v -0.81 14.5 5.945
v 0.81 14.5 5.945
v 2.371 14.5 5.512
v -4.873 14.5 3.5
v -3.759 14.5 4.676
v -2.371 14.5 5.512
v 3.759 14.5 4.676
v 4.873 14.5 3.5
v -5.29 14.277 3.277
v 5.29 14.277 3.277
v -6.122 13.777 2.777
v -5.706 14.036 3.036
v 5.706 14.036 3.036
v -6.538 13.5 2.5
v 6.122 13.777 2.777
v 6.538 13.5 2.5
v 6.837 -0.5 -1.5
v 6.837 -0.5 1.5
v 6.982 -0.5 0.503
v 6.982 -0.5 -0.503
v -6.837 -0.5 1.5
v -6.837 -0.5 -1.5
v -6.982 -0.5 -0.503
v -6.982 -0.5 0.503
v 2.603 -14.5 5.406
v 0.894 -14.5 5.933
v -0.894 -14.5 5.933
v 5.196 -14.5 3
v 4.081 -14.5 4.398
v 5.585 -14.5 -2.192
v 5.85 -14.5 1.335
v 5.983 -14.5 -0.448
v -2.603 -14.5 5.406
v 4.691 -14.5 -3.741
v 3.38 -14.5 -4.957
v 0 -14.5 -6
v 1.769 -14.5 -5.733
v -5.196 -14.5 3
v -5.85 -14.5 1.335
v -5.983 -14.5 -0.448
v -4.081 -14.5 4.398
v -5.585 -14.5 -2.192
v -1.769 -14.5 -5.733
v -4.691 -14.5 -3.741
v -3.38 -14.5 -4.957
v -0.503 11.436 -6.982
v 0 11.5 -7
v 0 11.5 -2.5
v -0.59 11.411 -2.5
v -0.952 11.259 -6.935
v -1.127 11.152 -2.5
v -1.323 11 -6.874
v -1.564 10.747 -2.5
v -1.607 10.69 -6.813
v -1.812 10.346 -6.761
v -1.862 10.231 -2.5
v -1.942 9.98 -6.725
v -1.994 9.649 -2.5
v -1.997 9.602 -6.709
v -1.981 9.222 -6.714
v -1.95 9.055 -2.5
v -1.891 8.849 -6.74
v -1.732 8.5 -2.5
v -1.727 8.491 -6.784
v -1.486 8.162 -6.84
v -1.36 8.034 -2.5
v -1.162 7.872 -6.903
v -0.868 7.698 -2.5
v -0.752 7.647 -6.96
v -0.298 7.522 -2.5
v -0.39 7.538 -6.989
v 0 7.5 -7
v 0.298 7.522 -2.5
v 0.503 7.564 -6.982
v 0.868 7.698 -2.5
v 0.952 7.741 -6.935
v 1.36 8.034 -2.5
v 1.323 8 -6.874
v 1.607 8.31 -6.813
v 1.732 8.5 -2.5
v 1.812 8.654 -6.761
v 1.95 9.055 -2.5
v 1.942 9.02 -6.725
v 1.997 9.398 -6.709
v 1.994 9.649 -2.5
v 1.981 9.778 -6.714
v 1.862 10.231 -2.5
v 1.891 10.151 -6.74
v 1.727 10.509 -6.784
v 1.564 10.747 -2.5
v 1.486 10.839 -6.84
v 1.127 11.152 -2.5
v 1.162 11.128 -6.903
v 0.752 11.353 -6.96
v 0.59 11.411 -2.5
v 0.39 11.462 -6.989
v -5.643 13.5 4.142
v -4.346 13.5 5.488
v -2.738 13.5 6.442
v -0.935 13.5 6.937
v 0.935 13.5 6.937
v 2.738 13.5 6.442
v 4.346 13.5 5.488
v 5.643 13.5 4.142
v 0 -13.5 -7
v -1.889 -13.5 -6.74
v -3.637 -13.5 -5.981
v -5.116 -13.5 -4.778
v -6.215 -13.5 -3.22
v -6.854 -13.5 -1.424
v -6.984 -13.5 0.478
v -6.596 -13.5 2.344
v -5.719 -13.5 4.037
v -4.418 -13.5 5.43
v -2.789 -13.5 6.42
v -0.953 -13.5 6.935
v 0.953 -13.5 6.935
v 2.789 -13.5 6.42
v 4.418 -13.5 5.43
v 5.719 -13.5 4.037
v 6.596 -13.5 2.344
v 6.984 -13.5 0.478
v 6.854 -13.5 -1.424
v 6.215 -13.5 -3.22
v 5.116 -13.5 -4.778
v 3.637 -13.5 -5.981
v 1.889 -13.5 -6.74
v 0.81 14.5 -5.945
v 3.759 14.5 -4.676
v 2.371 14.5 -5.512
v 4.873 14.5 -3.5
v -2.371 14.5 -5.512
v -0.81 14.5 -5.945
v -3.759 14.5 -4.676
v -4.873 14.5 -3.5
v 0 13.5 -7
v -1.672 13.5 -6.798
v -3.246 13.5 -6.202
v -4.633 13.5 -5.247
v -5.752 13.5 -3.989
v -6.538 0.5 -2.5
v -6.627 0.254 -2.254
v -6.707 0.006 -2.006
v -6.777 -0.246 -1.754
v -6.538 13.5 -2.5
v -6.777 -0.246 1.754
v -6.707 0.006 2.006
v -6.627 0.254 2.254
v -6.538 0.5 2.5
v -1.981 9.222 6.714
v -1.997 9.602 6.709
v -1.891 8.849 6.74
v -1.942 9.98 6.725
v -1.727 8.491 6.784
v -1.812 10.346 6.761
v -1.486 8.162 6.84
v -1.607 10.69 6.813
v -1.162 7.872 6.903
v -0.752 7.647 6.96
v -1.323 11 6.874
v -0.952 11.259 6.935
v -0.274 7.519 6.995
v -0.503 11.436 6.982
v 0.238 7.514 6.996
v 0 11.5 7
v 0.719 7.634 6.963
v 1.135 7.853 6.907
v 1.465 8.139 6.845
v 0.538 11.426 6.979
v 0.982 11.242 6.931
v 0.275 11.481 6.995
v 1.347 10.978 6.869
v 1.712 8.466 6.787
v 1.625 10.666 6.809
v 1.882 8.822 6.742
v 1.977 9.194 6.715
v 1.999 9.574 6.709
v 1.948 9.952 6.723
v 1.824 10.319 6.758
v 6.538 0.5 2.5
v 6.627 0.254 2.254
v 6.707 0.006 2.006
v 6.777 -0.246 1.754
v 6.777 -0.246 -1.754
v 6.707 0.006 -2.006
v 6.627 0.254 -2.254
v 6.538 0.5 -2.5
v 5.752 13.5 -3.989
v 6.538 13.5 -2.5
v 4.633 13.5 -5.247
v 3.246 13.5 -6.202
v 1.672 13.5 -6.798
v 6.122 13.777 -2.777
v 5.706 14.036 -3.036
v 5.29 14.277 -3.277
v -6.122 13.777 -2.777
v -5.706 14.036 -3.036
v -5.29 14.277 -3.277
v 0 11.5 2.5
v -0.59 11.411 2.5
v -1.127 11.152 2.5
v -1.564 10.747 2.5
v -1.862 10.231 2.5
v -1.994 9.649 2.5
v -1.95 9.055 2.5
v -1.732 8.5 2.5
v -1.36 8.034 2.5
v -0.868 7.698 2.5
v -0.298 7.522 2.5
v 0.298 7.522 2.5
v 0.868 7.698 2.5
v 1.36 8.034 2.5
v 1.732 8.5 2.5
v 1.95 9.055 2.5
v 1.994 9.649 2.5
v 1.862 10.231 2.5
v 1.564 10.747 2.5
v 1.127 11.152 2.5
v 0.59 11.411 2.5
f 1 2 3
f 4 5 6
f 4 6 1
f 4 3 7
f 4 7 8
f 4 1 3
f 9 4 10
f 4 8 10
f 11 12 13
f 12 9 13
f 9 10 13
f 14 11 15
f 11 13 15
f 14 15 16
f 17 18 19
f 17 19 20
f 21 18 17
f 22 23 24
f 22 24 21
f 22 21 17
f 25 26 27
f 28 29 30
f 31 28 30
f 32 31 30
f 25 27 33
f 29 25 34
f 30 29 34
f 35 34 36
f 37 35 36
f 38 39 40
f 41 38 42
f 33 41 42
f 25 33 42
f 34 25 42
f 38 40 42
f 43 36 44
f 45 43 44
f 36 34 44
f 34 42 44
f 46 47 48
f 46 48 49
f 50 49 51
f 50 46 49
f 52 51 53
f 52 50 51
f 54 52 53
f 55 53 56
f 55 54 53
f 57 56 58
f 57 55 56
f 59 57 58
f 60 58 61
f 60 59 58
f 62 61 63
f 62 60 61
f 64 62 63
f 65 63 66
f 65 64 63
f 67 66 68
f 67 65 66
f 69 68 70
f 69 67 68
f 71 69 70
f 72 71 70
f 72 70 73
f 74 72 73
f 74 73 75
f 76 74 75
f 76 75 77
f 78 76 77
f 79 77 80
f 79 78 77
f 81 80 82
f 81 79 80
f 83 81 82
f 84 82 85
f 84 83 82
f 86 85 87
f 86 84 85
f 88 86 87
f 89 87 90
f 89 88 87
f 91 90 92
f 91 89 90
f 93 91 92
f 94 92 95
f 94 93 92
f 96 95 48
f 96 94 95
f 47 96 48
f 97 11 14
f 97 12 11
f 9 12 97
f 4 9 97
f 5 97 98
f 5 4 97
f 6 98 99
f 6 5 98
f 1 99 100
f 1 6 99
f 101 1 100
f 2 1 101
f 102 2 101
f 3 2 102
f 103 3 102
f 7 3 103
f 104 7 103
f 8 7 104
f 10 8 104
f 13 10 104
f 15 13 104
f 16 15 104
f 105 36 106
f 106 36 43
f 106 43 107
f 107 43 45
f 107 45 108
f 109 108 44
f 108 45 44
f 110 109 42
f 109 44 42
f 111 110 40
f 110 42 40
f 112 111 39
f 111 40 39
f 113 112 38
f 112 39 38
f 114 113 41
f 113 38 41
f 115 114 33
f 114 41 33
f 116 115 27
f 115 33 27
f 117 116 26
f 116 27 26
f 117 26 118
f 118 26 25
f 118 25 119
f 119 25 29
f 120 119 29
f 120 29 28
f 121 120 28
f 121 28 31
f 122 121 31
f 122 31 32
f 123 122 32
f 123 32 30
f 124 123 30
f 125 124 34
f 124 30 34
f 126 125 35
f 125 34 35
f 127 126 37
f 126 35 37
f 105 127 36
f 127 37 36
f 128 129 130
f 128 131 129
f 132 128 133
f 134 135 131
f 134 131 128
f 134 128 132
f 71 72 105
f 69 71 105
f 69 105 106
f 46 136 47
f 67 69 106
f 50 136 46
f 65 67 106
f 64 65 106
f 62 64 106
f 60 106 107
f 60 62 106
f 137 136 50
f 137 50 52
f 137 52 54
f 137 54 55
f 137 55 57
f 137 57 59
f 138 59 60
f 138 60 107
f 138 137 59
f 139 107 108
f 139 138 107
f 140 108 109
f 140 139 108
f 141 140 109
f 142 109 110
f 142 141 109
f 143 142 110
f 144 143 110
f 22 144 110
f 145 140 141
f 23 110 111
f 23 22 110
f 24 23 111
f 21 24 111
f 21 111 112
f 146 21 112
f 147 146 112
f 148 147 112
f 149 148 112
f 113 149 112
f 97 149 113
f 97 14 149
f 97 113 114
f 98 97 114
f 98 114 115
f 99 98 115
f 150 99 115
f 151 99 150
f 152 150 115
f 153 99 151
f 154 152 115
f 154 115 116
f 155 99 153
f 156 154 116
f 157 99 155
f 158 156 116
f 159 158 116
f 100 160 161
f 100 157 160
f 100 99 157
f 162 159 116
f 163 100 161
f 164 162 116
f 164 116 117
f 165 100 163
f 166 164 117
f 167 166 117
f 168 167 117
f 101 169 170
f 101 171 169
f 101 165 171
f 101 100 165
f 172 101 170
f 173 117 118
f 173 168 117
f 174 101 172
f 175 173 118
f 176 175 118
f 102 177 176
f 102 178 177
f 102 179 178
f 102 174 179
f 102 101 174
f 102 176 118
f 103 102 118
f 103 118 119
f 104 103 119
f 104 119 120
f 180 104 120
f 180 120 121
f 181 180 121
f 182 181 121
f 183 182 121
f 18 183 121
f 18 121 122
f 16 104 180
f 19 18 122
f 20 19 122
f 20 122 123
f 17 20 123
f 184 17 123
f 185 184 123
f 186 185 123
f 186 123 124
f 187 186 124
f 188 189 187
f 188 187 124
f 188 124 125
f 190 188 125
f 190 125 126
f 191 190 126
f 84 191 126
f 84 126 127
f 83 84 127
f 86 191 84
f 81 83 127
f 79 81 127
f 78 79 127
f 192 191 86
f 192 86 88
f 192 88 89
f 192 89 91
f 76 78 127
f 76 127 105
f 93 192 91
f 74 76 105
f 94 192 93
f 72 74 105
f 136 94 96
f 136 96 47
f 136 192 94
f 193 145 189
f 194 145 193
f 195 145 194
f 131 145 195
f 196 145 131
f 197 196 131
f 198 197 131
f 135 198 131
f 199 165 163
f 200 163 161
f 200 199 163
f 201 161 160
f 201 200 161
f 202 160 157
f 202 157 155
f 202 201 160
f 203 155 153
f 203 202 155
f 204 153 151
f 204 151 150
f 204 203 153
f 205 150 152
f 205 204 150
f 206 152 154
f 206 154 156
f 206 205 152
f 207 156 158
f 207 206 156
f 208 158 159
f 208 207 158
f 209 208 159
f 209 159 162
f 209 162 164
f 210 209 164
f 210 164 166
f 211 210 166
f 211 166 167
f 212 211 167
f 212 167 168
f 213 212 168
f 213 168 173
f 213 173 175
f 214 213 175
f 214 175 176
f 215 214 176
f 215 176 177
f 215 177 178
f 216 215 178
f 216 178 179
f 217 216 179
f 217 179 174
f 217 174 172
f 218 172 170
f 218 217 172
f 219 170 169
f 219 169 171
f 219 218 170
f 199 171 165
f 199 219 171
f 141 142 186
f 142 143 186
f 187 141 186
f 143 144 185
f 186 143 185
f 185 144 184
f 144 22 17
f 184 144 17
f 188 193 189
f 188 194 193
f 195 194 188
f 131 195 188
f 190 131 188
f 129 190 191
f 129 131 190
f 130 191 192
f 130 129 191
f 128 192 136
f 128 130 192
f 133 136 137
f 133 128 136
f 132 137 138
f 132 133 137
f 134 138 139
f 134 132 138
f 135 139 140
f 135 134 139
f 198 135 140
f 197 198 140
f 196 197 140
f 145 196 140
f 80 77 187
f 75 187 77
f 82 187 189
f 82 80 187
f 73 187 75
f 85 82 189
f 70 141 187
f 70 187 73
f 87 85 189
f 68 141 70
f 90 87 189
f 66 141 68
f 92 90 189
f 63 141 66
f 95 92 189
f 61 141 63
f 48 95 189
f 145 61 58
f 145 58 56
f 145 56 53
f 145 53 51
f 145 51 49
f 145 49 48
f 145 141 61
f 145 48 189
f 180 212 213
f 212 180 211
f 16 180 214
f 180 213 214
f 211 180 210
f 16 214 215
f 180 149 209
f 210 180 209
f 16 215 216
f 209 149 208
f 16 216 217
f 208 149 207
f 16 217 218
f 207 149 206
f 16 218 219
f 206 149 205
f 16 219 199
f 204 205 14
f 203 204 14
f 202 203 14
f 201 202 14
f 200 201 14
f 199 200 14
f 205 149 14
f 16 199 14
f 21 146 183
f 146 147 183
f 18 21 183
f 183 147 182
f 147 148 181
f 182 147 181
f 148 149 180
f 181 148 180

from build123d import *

# Parameters (mm, degrees)
ESBO_O1_R                  = 7
RESSALTO_EXTRUS_O1_DEPTH   = 14.5
CORTE_EXTRUS_O1_DEPTH      = 18.557049866
CORTE_EXTRUS_O1_DEPTH_BACK = 18.557049866
ESBO_O2_W                  = 5
ESBO_O2_H                  = 15
CORTE_EXTRUS_O2_DEPTH      = 18.557049866
CORTE_EXTRUS_O2_DEPTH_BACK = 18.557049866
ESBO_O3_R                  = 2
CHANFRO1_SIZE              = 1
CHANFRO2_SIZE              = 1


with BuildPart() as part:
    # Esboço1 → Ressalto-extrusão1 (new, symmetric)
    with BuildSketch(Plane(origin=(0, 0, 0), x_dir=(1, 0, 0), z_dir=(0, 1, 0))):
        with Locations(Location((0, 0, 0), (0, 0, 90))):
            Circle(ESBO_O1_R)
    extrude(amount=RESSALTO_EXTRUS_O1_DEPTH, both=True)

    # Esboço2 → Corte-extrusão1 (cut, two sides: drawn at the far end of the back side and taken through both)
    with BuildSketch(Plane(origin=(0, 0, 0), x_dir=(0, 0, -1), z_dir=(1, 0, 0)).offset(-CORTE_EXTRUS_O1_DEPTH_BACK)):
        with Locations((0, 7)):
            Rectangle(ESBO_O2_W, ESBO_O2_H)
    extrude(amount=CORTE_EXTRUS_O1_DEPTH + CORTE_EXTRUS_O1_DEPTH_BACK, mode=Mode.SUBTRACT)

    # Esboço3 → Corte-extrusão2 (cut, two sides: drawn at the far end of the back side and taken through both)
    with BuildSketch(Plane.XY.offset(-CORTE_EXTRUS_O2_DEPTH_BACK)):
        with Locations(Location((0, 9.5, 0), (0, 0, 90))):
            Circle(ESBO_O3_R)
    extrude(amount=CORTE_EXTRUS_O2_DEPTH + CORTE_EXTRUS_O2_DEPTH_BACK, mode=Mode.SUBTRACT)

    # Chanfro1
    chanfro1_edges = [part.edges().sort_by_distance(p)[0] for p in [
        (0, -14.5, 7),
    ]]
    chamfer(chanfro1_edges, length=CHANFRO1_SIZE)

    # Chanfro2
    chanfro2_edges = [part.edges().sort_by_distance(p)[0] for p in [
        (0, -0.5, -2.5),
        (0, -0.5, 2.5),
        (3.968626967, 14.5, -5.766281297),
        (0, 14.5, 7),
        (0, 14.5, -2.5),
        (0, 14.5, 2.5),
    ]]
    chamfer(chanfro2_edges, length=CHANFRO2_SIZE)


solid = part.part
